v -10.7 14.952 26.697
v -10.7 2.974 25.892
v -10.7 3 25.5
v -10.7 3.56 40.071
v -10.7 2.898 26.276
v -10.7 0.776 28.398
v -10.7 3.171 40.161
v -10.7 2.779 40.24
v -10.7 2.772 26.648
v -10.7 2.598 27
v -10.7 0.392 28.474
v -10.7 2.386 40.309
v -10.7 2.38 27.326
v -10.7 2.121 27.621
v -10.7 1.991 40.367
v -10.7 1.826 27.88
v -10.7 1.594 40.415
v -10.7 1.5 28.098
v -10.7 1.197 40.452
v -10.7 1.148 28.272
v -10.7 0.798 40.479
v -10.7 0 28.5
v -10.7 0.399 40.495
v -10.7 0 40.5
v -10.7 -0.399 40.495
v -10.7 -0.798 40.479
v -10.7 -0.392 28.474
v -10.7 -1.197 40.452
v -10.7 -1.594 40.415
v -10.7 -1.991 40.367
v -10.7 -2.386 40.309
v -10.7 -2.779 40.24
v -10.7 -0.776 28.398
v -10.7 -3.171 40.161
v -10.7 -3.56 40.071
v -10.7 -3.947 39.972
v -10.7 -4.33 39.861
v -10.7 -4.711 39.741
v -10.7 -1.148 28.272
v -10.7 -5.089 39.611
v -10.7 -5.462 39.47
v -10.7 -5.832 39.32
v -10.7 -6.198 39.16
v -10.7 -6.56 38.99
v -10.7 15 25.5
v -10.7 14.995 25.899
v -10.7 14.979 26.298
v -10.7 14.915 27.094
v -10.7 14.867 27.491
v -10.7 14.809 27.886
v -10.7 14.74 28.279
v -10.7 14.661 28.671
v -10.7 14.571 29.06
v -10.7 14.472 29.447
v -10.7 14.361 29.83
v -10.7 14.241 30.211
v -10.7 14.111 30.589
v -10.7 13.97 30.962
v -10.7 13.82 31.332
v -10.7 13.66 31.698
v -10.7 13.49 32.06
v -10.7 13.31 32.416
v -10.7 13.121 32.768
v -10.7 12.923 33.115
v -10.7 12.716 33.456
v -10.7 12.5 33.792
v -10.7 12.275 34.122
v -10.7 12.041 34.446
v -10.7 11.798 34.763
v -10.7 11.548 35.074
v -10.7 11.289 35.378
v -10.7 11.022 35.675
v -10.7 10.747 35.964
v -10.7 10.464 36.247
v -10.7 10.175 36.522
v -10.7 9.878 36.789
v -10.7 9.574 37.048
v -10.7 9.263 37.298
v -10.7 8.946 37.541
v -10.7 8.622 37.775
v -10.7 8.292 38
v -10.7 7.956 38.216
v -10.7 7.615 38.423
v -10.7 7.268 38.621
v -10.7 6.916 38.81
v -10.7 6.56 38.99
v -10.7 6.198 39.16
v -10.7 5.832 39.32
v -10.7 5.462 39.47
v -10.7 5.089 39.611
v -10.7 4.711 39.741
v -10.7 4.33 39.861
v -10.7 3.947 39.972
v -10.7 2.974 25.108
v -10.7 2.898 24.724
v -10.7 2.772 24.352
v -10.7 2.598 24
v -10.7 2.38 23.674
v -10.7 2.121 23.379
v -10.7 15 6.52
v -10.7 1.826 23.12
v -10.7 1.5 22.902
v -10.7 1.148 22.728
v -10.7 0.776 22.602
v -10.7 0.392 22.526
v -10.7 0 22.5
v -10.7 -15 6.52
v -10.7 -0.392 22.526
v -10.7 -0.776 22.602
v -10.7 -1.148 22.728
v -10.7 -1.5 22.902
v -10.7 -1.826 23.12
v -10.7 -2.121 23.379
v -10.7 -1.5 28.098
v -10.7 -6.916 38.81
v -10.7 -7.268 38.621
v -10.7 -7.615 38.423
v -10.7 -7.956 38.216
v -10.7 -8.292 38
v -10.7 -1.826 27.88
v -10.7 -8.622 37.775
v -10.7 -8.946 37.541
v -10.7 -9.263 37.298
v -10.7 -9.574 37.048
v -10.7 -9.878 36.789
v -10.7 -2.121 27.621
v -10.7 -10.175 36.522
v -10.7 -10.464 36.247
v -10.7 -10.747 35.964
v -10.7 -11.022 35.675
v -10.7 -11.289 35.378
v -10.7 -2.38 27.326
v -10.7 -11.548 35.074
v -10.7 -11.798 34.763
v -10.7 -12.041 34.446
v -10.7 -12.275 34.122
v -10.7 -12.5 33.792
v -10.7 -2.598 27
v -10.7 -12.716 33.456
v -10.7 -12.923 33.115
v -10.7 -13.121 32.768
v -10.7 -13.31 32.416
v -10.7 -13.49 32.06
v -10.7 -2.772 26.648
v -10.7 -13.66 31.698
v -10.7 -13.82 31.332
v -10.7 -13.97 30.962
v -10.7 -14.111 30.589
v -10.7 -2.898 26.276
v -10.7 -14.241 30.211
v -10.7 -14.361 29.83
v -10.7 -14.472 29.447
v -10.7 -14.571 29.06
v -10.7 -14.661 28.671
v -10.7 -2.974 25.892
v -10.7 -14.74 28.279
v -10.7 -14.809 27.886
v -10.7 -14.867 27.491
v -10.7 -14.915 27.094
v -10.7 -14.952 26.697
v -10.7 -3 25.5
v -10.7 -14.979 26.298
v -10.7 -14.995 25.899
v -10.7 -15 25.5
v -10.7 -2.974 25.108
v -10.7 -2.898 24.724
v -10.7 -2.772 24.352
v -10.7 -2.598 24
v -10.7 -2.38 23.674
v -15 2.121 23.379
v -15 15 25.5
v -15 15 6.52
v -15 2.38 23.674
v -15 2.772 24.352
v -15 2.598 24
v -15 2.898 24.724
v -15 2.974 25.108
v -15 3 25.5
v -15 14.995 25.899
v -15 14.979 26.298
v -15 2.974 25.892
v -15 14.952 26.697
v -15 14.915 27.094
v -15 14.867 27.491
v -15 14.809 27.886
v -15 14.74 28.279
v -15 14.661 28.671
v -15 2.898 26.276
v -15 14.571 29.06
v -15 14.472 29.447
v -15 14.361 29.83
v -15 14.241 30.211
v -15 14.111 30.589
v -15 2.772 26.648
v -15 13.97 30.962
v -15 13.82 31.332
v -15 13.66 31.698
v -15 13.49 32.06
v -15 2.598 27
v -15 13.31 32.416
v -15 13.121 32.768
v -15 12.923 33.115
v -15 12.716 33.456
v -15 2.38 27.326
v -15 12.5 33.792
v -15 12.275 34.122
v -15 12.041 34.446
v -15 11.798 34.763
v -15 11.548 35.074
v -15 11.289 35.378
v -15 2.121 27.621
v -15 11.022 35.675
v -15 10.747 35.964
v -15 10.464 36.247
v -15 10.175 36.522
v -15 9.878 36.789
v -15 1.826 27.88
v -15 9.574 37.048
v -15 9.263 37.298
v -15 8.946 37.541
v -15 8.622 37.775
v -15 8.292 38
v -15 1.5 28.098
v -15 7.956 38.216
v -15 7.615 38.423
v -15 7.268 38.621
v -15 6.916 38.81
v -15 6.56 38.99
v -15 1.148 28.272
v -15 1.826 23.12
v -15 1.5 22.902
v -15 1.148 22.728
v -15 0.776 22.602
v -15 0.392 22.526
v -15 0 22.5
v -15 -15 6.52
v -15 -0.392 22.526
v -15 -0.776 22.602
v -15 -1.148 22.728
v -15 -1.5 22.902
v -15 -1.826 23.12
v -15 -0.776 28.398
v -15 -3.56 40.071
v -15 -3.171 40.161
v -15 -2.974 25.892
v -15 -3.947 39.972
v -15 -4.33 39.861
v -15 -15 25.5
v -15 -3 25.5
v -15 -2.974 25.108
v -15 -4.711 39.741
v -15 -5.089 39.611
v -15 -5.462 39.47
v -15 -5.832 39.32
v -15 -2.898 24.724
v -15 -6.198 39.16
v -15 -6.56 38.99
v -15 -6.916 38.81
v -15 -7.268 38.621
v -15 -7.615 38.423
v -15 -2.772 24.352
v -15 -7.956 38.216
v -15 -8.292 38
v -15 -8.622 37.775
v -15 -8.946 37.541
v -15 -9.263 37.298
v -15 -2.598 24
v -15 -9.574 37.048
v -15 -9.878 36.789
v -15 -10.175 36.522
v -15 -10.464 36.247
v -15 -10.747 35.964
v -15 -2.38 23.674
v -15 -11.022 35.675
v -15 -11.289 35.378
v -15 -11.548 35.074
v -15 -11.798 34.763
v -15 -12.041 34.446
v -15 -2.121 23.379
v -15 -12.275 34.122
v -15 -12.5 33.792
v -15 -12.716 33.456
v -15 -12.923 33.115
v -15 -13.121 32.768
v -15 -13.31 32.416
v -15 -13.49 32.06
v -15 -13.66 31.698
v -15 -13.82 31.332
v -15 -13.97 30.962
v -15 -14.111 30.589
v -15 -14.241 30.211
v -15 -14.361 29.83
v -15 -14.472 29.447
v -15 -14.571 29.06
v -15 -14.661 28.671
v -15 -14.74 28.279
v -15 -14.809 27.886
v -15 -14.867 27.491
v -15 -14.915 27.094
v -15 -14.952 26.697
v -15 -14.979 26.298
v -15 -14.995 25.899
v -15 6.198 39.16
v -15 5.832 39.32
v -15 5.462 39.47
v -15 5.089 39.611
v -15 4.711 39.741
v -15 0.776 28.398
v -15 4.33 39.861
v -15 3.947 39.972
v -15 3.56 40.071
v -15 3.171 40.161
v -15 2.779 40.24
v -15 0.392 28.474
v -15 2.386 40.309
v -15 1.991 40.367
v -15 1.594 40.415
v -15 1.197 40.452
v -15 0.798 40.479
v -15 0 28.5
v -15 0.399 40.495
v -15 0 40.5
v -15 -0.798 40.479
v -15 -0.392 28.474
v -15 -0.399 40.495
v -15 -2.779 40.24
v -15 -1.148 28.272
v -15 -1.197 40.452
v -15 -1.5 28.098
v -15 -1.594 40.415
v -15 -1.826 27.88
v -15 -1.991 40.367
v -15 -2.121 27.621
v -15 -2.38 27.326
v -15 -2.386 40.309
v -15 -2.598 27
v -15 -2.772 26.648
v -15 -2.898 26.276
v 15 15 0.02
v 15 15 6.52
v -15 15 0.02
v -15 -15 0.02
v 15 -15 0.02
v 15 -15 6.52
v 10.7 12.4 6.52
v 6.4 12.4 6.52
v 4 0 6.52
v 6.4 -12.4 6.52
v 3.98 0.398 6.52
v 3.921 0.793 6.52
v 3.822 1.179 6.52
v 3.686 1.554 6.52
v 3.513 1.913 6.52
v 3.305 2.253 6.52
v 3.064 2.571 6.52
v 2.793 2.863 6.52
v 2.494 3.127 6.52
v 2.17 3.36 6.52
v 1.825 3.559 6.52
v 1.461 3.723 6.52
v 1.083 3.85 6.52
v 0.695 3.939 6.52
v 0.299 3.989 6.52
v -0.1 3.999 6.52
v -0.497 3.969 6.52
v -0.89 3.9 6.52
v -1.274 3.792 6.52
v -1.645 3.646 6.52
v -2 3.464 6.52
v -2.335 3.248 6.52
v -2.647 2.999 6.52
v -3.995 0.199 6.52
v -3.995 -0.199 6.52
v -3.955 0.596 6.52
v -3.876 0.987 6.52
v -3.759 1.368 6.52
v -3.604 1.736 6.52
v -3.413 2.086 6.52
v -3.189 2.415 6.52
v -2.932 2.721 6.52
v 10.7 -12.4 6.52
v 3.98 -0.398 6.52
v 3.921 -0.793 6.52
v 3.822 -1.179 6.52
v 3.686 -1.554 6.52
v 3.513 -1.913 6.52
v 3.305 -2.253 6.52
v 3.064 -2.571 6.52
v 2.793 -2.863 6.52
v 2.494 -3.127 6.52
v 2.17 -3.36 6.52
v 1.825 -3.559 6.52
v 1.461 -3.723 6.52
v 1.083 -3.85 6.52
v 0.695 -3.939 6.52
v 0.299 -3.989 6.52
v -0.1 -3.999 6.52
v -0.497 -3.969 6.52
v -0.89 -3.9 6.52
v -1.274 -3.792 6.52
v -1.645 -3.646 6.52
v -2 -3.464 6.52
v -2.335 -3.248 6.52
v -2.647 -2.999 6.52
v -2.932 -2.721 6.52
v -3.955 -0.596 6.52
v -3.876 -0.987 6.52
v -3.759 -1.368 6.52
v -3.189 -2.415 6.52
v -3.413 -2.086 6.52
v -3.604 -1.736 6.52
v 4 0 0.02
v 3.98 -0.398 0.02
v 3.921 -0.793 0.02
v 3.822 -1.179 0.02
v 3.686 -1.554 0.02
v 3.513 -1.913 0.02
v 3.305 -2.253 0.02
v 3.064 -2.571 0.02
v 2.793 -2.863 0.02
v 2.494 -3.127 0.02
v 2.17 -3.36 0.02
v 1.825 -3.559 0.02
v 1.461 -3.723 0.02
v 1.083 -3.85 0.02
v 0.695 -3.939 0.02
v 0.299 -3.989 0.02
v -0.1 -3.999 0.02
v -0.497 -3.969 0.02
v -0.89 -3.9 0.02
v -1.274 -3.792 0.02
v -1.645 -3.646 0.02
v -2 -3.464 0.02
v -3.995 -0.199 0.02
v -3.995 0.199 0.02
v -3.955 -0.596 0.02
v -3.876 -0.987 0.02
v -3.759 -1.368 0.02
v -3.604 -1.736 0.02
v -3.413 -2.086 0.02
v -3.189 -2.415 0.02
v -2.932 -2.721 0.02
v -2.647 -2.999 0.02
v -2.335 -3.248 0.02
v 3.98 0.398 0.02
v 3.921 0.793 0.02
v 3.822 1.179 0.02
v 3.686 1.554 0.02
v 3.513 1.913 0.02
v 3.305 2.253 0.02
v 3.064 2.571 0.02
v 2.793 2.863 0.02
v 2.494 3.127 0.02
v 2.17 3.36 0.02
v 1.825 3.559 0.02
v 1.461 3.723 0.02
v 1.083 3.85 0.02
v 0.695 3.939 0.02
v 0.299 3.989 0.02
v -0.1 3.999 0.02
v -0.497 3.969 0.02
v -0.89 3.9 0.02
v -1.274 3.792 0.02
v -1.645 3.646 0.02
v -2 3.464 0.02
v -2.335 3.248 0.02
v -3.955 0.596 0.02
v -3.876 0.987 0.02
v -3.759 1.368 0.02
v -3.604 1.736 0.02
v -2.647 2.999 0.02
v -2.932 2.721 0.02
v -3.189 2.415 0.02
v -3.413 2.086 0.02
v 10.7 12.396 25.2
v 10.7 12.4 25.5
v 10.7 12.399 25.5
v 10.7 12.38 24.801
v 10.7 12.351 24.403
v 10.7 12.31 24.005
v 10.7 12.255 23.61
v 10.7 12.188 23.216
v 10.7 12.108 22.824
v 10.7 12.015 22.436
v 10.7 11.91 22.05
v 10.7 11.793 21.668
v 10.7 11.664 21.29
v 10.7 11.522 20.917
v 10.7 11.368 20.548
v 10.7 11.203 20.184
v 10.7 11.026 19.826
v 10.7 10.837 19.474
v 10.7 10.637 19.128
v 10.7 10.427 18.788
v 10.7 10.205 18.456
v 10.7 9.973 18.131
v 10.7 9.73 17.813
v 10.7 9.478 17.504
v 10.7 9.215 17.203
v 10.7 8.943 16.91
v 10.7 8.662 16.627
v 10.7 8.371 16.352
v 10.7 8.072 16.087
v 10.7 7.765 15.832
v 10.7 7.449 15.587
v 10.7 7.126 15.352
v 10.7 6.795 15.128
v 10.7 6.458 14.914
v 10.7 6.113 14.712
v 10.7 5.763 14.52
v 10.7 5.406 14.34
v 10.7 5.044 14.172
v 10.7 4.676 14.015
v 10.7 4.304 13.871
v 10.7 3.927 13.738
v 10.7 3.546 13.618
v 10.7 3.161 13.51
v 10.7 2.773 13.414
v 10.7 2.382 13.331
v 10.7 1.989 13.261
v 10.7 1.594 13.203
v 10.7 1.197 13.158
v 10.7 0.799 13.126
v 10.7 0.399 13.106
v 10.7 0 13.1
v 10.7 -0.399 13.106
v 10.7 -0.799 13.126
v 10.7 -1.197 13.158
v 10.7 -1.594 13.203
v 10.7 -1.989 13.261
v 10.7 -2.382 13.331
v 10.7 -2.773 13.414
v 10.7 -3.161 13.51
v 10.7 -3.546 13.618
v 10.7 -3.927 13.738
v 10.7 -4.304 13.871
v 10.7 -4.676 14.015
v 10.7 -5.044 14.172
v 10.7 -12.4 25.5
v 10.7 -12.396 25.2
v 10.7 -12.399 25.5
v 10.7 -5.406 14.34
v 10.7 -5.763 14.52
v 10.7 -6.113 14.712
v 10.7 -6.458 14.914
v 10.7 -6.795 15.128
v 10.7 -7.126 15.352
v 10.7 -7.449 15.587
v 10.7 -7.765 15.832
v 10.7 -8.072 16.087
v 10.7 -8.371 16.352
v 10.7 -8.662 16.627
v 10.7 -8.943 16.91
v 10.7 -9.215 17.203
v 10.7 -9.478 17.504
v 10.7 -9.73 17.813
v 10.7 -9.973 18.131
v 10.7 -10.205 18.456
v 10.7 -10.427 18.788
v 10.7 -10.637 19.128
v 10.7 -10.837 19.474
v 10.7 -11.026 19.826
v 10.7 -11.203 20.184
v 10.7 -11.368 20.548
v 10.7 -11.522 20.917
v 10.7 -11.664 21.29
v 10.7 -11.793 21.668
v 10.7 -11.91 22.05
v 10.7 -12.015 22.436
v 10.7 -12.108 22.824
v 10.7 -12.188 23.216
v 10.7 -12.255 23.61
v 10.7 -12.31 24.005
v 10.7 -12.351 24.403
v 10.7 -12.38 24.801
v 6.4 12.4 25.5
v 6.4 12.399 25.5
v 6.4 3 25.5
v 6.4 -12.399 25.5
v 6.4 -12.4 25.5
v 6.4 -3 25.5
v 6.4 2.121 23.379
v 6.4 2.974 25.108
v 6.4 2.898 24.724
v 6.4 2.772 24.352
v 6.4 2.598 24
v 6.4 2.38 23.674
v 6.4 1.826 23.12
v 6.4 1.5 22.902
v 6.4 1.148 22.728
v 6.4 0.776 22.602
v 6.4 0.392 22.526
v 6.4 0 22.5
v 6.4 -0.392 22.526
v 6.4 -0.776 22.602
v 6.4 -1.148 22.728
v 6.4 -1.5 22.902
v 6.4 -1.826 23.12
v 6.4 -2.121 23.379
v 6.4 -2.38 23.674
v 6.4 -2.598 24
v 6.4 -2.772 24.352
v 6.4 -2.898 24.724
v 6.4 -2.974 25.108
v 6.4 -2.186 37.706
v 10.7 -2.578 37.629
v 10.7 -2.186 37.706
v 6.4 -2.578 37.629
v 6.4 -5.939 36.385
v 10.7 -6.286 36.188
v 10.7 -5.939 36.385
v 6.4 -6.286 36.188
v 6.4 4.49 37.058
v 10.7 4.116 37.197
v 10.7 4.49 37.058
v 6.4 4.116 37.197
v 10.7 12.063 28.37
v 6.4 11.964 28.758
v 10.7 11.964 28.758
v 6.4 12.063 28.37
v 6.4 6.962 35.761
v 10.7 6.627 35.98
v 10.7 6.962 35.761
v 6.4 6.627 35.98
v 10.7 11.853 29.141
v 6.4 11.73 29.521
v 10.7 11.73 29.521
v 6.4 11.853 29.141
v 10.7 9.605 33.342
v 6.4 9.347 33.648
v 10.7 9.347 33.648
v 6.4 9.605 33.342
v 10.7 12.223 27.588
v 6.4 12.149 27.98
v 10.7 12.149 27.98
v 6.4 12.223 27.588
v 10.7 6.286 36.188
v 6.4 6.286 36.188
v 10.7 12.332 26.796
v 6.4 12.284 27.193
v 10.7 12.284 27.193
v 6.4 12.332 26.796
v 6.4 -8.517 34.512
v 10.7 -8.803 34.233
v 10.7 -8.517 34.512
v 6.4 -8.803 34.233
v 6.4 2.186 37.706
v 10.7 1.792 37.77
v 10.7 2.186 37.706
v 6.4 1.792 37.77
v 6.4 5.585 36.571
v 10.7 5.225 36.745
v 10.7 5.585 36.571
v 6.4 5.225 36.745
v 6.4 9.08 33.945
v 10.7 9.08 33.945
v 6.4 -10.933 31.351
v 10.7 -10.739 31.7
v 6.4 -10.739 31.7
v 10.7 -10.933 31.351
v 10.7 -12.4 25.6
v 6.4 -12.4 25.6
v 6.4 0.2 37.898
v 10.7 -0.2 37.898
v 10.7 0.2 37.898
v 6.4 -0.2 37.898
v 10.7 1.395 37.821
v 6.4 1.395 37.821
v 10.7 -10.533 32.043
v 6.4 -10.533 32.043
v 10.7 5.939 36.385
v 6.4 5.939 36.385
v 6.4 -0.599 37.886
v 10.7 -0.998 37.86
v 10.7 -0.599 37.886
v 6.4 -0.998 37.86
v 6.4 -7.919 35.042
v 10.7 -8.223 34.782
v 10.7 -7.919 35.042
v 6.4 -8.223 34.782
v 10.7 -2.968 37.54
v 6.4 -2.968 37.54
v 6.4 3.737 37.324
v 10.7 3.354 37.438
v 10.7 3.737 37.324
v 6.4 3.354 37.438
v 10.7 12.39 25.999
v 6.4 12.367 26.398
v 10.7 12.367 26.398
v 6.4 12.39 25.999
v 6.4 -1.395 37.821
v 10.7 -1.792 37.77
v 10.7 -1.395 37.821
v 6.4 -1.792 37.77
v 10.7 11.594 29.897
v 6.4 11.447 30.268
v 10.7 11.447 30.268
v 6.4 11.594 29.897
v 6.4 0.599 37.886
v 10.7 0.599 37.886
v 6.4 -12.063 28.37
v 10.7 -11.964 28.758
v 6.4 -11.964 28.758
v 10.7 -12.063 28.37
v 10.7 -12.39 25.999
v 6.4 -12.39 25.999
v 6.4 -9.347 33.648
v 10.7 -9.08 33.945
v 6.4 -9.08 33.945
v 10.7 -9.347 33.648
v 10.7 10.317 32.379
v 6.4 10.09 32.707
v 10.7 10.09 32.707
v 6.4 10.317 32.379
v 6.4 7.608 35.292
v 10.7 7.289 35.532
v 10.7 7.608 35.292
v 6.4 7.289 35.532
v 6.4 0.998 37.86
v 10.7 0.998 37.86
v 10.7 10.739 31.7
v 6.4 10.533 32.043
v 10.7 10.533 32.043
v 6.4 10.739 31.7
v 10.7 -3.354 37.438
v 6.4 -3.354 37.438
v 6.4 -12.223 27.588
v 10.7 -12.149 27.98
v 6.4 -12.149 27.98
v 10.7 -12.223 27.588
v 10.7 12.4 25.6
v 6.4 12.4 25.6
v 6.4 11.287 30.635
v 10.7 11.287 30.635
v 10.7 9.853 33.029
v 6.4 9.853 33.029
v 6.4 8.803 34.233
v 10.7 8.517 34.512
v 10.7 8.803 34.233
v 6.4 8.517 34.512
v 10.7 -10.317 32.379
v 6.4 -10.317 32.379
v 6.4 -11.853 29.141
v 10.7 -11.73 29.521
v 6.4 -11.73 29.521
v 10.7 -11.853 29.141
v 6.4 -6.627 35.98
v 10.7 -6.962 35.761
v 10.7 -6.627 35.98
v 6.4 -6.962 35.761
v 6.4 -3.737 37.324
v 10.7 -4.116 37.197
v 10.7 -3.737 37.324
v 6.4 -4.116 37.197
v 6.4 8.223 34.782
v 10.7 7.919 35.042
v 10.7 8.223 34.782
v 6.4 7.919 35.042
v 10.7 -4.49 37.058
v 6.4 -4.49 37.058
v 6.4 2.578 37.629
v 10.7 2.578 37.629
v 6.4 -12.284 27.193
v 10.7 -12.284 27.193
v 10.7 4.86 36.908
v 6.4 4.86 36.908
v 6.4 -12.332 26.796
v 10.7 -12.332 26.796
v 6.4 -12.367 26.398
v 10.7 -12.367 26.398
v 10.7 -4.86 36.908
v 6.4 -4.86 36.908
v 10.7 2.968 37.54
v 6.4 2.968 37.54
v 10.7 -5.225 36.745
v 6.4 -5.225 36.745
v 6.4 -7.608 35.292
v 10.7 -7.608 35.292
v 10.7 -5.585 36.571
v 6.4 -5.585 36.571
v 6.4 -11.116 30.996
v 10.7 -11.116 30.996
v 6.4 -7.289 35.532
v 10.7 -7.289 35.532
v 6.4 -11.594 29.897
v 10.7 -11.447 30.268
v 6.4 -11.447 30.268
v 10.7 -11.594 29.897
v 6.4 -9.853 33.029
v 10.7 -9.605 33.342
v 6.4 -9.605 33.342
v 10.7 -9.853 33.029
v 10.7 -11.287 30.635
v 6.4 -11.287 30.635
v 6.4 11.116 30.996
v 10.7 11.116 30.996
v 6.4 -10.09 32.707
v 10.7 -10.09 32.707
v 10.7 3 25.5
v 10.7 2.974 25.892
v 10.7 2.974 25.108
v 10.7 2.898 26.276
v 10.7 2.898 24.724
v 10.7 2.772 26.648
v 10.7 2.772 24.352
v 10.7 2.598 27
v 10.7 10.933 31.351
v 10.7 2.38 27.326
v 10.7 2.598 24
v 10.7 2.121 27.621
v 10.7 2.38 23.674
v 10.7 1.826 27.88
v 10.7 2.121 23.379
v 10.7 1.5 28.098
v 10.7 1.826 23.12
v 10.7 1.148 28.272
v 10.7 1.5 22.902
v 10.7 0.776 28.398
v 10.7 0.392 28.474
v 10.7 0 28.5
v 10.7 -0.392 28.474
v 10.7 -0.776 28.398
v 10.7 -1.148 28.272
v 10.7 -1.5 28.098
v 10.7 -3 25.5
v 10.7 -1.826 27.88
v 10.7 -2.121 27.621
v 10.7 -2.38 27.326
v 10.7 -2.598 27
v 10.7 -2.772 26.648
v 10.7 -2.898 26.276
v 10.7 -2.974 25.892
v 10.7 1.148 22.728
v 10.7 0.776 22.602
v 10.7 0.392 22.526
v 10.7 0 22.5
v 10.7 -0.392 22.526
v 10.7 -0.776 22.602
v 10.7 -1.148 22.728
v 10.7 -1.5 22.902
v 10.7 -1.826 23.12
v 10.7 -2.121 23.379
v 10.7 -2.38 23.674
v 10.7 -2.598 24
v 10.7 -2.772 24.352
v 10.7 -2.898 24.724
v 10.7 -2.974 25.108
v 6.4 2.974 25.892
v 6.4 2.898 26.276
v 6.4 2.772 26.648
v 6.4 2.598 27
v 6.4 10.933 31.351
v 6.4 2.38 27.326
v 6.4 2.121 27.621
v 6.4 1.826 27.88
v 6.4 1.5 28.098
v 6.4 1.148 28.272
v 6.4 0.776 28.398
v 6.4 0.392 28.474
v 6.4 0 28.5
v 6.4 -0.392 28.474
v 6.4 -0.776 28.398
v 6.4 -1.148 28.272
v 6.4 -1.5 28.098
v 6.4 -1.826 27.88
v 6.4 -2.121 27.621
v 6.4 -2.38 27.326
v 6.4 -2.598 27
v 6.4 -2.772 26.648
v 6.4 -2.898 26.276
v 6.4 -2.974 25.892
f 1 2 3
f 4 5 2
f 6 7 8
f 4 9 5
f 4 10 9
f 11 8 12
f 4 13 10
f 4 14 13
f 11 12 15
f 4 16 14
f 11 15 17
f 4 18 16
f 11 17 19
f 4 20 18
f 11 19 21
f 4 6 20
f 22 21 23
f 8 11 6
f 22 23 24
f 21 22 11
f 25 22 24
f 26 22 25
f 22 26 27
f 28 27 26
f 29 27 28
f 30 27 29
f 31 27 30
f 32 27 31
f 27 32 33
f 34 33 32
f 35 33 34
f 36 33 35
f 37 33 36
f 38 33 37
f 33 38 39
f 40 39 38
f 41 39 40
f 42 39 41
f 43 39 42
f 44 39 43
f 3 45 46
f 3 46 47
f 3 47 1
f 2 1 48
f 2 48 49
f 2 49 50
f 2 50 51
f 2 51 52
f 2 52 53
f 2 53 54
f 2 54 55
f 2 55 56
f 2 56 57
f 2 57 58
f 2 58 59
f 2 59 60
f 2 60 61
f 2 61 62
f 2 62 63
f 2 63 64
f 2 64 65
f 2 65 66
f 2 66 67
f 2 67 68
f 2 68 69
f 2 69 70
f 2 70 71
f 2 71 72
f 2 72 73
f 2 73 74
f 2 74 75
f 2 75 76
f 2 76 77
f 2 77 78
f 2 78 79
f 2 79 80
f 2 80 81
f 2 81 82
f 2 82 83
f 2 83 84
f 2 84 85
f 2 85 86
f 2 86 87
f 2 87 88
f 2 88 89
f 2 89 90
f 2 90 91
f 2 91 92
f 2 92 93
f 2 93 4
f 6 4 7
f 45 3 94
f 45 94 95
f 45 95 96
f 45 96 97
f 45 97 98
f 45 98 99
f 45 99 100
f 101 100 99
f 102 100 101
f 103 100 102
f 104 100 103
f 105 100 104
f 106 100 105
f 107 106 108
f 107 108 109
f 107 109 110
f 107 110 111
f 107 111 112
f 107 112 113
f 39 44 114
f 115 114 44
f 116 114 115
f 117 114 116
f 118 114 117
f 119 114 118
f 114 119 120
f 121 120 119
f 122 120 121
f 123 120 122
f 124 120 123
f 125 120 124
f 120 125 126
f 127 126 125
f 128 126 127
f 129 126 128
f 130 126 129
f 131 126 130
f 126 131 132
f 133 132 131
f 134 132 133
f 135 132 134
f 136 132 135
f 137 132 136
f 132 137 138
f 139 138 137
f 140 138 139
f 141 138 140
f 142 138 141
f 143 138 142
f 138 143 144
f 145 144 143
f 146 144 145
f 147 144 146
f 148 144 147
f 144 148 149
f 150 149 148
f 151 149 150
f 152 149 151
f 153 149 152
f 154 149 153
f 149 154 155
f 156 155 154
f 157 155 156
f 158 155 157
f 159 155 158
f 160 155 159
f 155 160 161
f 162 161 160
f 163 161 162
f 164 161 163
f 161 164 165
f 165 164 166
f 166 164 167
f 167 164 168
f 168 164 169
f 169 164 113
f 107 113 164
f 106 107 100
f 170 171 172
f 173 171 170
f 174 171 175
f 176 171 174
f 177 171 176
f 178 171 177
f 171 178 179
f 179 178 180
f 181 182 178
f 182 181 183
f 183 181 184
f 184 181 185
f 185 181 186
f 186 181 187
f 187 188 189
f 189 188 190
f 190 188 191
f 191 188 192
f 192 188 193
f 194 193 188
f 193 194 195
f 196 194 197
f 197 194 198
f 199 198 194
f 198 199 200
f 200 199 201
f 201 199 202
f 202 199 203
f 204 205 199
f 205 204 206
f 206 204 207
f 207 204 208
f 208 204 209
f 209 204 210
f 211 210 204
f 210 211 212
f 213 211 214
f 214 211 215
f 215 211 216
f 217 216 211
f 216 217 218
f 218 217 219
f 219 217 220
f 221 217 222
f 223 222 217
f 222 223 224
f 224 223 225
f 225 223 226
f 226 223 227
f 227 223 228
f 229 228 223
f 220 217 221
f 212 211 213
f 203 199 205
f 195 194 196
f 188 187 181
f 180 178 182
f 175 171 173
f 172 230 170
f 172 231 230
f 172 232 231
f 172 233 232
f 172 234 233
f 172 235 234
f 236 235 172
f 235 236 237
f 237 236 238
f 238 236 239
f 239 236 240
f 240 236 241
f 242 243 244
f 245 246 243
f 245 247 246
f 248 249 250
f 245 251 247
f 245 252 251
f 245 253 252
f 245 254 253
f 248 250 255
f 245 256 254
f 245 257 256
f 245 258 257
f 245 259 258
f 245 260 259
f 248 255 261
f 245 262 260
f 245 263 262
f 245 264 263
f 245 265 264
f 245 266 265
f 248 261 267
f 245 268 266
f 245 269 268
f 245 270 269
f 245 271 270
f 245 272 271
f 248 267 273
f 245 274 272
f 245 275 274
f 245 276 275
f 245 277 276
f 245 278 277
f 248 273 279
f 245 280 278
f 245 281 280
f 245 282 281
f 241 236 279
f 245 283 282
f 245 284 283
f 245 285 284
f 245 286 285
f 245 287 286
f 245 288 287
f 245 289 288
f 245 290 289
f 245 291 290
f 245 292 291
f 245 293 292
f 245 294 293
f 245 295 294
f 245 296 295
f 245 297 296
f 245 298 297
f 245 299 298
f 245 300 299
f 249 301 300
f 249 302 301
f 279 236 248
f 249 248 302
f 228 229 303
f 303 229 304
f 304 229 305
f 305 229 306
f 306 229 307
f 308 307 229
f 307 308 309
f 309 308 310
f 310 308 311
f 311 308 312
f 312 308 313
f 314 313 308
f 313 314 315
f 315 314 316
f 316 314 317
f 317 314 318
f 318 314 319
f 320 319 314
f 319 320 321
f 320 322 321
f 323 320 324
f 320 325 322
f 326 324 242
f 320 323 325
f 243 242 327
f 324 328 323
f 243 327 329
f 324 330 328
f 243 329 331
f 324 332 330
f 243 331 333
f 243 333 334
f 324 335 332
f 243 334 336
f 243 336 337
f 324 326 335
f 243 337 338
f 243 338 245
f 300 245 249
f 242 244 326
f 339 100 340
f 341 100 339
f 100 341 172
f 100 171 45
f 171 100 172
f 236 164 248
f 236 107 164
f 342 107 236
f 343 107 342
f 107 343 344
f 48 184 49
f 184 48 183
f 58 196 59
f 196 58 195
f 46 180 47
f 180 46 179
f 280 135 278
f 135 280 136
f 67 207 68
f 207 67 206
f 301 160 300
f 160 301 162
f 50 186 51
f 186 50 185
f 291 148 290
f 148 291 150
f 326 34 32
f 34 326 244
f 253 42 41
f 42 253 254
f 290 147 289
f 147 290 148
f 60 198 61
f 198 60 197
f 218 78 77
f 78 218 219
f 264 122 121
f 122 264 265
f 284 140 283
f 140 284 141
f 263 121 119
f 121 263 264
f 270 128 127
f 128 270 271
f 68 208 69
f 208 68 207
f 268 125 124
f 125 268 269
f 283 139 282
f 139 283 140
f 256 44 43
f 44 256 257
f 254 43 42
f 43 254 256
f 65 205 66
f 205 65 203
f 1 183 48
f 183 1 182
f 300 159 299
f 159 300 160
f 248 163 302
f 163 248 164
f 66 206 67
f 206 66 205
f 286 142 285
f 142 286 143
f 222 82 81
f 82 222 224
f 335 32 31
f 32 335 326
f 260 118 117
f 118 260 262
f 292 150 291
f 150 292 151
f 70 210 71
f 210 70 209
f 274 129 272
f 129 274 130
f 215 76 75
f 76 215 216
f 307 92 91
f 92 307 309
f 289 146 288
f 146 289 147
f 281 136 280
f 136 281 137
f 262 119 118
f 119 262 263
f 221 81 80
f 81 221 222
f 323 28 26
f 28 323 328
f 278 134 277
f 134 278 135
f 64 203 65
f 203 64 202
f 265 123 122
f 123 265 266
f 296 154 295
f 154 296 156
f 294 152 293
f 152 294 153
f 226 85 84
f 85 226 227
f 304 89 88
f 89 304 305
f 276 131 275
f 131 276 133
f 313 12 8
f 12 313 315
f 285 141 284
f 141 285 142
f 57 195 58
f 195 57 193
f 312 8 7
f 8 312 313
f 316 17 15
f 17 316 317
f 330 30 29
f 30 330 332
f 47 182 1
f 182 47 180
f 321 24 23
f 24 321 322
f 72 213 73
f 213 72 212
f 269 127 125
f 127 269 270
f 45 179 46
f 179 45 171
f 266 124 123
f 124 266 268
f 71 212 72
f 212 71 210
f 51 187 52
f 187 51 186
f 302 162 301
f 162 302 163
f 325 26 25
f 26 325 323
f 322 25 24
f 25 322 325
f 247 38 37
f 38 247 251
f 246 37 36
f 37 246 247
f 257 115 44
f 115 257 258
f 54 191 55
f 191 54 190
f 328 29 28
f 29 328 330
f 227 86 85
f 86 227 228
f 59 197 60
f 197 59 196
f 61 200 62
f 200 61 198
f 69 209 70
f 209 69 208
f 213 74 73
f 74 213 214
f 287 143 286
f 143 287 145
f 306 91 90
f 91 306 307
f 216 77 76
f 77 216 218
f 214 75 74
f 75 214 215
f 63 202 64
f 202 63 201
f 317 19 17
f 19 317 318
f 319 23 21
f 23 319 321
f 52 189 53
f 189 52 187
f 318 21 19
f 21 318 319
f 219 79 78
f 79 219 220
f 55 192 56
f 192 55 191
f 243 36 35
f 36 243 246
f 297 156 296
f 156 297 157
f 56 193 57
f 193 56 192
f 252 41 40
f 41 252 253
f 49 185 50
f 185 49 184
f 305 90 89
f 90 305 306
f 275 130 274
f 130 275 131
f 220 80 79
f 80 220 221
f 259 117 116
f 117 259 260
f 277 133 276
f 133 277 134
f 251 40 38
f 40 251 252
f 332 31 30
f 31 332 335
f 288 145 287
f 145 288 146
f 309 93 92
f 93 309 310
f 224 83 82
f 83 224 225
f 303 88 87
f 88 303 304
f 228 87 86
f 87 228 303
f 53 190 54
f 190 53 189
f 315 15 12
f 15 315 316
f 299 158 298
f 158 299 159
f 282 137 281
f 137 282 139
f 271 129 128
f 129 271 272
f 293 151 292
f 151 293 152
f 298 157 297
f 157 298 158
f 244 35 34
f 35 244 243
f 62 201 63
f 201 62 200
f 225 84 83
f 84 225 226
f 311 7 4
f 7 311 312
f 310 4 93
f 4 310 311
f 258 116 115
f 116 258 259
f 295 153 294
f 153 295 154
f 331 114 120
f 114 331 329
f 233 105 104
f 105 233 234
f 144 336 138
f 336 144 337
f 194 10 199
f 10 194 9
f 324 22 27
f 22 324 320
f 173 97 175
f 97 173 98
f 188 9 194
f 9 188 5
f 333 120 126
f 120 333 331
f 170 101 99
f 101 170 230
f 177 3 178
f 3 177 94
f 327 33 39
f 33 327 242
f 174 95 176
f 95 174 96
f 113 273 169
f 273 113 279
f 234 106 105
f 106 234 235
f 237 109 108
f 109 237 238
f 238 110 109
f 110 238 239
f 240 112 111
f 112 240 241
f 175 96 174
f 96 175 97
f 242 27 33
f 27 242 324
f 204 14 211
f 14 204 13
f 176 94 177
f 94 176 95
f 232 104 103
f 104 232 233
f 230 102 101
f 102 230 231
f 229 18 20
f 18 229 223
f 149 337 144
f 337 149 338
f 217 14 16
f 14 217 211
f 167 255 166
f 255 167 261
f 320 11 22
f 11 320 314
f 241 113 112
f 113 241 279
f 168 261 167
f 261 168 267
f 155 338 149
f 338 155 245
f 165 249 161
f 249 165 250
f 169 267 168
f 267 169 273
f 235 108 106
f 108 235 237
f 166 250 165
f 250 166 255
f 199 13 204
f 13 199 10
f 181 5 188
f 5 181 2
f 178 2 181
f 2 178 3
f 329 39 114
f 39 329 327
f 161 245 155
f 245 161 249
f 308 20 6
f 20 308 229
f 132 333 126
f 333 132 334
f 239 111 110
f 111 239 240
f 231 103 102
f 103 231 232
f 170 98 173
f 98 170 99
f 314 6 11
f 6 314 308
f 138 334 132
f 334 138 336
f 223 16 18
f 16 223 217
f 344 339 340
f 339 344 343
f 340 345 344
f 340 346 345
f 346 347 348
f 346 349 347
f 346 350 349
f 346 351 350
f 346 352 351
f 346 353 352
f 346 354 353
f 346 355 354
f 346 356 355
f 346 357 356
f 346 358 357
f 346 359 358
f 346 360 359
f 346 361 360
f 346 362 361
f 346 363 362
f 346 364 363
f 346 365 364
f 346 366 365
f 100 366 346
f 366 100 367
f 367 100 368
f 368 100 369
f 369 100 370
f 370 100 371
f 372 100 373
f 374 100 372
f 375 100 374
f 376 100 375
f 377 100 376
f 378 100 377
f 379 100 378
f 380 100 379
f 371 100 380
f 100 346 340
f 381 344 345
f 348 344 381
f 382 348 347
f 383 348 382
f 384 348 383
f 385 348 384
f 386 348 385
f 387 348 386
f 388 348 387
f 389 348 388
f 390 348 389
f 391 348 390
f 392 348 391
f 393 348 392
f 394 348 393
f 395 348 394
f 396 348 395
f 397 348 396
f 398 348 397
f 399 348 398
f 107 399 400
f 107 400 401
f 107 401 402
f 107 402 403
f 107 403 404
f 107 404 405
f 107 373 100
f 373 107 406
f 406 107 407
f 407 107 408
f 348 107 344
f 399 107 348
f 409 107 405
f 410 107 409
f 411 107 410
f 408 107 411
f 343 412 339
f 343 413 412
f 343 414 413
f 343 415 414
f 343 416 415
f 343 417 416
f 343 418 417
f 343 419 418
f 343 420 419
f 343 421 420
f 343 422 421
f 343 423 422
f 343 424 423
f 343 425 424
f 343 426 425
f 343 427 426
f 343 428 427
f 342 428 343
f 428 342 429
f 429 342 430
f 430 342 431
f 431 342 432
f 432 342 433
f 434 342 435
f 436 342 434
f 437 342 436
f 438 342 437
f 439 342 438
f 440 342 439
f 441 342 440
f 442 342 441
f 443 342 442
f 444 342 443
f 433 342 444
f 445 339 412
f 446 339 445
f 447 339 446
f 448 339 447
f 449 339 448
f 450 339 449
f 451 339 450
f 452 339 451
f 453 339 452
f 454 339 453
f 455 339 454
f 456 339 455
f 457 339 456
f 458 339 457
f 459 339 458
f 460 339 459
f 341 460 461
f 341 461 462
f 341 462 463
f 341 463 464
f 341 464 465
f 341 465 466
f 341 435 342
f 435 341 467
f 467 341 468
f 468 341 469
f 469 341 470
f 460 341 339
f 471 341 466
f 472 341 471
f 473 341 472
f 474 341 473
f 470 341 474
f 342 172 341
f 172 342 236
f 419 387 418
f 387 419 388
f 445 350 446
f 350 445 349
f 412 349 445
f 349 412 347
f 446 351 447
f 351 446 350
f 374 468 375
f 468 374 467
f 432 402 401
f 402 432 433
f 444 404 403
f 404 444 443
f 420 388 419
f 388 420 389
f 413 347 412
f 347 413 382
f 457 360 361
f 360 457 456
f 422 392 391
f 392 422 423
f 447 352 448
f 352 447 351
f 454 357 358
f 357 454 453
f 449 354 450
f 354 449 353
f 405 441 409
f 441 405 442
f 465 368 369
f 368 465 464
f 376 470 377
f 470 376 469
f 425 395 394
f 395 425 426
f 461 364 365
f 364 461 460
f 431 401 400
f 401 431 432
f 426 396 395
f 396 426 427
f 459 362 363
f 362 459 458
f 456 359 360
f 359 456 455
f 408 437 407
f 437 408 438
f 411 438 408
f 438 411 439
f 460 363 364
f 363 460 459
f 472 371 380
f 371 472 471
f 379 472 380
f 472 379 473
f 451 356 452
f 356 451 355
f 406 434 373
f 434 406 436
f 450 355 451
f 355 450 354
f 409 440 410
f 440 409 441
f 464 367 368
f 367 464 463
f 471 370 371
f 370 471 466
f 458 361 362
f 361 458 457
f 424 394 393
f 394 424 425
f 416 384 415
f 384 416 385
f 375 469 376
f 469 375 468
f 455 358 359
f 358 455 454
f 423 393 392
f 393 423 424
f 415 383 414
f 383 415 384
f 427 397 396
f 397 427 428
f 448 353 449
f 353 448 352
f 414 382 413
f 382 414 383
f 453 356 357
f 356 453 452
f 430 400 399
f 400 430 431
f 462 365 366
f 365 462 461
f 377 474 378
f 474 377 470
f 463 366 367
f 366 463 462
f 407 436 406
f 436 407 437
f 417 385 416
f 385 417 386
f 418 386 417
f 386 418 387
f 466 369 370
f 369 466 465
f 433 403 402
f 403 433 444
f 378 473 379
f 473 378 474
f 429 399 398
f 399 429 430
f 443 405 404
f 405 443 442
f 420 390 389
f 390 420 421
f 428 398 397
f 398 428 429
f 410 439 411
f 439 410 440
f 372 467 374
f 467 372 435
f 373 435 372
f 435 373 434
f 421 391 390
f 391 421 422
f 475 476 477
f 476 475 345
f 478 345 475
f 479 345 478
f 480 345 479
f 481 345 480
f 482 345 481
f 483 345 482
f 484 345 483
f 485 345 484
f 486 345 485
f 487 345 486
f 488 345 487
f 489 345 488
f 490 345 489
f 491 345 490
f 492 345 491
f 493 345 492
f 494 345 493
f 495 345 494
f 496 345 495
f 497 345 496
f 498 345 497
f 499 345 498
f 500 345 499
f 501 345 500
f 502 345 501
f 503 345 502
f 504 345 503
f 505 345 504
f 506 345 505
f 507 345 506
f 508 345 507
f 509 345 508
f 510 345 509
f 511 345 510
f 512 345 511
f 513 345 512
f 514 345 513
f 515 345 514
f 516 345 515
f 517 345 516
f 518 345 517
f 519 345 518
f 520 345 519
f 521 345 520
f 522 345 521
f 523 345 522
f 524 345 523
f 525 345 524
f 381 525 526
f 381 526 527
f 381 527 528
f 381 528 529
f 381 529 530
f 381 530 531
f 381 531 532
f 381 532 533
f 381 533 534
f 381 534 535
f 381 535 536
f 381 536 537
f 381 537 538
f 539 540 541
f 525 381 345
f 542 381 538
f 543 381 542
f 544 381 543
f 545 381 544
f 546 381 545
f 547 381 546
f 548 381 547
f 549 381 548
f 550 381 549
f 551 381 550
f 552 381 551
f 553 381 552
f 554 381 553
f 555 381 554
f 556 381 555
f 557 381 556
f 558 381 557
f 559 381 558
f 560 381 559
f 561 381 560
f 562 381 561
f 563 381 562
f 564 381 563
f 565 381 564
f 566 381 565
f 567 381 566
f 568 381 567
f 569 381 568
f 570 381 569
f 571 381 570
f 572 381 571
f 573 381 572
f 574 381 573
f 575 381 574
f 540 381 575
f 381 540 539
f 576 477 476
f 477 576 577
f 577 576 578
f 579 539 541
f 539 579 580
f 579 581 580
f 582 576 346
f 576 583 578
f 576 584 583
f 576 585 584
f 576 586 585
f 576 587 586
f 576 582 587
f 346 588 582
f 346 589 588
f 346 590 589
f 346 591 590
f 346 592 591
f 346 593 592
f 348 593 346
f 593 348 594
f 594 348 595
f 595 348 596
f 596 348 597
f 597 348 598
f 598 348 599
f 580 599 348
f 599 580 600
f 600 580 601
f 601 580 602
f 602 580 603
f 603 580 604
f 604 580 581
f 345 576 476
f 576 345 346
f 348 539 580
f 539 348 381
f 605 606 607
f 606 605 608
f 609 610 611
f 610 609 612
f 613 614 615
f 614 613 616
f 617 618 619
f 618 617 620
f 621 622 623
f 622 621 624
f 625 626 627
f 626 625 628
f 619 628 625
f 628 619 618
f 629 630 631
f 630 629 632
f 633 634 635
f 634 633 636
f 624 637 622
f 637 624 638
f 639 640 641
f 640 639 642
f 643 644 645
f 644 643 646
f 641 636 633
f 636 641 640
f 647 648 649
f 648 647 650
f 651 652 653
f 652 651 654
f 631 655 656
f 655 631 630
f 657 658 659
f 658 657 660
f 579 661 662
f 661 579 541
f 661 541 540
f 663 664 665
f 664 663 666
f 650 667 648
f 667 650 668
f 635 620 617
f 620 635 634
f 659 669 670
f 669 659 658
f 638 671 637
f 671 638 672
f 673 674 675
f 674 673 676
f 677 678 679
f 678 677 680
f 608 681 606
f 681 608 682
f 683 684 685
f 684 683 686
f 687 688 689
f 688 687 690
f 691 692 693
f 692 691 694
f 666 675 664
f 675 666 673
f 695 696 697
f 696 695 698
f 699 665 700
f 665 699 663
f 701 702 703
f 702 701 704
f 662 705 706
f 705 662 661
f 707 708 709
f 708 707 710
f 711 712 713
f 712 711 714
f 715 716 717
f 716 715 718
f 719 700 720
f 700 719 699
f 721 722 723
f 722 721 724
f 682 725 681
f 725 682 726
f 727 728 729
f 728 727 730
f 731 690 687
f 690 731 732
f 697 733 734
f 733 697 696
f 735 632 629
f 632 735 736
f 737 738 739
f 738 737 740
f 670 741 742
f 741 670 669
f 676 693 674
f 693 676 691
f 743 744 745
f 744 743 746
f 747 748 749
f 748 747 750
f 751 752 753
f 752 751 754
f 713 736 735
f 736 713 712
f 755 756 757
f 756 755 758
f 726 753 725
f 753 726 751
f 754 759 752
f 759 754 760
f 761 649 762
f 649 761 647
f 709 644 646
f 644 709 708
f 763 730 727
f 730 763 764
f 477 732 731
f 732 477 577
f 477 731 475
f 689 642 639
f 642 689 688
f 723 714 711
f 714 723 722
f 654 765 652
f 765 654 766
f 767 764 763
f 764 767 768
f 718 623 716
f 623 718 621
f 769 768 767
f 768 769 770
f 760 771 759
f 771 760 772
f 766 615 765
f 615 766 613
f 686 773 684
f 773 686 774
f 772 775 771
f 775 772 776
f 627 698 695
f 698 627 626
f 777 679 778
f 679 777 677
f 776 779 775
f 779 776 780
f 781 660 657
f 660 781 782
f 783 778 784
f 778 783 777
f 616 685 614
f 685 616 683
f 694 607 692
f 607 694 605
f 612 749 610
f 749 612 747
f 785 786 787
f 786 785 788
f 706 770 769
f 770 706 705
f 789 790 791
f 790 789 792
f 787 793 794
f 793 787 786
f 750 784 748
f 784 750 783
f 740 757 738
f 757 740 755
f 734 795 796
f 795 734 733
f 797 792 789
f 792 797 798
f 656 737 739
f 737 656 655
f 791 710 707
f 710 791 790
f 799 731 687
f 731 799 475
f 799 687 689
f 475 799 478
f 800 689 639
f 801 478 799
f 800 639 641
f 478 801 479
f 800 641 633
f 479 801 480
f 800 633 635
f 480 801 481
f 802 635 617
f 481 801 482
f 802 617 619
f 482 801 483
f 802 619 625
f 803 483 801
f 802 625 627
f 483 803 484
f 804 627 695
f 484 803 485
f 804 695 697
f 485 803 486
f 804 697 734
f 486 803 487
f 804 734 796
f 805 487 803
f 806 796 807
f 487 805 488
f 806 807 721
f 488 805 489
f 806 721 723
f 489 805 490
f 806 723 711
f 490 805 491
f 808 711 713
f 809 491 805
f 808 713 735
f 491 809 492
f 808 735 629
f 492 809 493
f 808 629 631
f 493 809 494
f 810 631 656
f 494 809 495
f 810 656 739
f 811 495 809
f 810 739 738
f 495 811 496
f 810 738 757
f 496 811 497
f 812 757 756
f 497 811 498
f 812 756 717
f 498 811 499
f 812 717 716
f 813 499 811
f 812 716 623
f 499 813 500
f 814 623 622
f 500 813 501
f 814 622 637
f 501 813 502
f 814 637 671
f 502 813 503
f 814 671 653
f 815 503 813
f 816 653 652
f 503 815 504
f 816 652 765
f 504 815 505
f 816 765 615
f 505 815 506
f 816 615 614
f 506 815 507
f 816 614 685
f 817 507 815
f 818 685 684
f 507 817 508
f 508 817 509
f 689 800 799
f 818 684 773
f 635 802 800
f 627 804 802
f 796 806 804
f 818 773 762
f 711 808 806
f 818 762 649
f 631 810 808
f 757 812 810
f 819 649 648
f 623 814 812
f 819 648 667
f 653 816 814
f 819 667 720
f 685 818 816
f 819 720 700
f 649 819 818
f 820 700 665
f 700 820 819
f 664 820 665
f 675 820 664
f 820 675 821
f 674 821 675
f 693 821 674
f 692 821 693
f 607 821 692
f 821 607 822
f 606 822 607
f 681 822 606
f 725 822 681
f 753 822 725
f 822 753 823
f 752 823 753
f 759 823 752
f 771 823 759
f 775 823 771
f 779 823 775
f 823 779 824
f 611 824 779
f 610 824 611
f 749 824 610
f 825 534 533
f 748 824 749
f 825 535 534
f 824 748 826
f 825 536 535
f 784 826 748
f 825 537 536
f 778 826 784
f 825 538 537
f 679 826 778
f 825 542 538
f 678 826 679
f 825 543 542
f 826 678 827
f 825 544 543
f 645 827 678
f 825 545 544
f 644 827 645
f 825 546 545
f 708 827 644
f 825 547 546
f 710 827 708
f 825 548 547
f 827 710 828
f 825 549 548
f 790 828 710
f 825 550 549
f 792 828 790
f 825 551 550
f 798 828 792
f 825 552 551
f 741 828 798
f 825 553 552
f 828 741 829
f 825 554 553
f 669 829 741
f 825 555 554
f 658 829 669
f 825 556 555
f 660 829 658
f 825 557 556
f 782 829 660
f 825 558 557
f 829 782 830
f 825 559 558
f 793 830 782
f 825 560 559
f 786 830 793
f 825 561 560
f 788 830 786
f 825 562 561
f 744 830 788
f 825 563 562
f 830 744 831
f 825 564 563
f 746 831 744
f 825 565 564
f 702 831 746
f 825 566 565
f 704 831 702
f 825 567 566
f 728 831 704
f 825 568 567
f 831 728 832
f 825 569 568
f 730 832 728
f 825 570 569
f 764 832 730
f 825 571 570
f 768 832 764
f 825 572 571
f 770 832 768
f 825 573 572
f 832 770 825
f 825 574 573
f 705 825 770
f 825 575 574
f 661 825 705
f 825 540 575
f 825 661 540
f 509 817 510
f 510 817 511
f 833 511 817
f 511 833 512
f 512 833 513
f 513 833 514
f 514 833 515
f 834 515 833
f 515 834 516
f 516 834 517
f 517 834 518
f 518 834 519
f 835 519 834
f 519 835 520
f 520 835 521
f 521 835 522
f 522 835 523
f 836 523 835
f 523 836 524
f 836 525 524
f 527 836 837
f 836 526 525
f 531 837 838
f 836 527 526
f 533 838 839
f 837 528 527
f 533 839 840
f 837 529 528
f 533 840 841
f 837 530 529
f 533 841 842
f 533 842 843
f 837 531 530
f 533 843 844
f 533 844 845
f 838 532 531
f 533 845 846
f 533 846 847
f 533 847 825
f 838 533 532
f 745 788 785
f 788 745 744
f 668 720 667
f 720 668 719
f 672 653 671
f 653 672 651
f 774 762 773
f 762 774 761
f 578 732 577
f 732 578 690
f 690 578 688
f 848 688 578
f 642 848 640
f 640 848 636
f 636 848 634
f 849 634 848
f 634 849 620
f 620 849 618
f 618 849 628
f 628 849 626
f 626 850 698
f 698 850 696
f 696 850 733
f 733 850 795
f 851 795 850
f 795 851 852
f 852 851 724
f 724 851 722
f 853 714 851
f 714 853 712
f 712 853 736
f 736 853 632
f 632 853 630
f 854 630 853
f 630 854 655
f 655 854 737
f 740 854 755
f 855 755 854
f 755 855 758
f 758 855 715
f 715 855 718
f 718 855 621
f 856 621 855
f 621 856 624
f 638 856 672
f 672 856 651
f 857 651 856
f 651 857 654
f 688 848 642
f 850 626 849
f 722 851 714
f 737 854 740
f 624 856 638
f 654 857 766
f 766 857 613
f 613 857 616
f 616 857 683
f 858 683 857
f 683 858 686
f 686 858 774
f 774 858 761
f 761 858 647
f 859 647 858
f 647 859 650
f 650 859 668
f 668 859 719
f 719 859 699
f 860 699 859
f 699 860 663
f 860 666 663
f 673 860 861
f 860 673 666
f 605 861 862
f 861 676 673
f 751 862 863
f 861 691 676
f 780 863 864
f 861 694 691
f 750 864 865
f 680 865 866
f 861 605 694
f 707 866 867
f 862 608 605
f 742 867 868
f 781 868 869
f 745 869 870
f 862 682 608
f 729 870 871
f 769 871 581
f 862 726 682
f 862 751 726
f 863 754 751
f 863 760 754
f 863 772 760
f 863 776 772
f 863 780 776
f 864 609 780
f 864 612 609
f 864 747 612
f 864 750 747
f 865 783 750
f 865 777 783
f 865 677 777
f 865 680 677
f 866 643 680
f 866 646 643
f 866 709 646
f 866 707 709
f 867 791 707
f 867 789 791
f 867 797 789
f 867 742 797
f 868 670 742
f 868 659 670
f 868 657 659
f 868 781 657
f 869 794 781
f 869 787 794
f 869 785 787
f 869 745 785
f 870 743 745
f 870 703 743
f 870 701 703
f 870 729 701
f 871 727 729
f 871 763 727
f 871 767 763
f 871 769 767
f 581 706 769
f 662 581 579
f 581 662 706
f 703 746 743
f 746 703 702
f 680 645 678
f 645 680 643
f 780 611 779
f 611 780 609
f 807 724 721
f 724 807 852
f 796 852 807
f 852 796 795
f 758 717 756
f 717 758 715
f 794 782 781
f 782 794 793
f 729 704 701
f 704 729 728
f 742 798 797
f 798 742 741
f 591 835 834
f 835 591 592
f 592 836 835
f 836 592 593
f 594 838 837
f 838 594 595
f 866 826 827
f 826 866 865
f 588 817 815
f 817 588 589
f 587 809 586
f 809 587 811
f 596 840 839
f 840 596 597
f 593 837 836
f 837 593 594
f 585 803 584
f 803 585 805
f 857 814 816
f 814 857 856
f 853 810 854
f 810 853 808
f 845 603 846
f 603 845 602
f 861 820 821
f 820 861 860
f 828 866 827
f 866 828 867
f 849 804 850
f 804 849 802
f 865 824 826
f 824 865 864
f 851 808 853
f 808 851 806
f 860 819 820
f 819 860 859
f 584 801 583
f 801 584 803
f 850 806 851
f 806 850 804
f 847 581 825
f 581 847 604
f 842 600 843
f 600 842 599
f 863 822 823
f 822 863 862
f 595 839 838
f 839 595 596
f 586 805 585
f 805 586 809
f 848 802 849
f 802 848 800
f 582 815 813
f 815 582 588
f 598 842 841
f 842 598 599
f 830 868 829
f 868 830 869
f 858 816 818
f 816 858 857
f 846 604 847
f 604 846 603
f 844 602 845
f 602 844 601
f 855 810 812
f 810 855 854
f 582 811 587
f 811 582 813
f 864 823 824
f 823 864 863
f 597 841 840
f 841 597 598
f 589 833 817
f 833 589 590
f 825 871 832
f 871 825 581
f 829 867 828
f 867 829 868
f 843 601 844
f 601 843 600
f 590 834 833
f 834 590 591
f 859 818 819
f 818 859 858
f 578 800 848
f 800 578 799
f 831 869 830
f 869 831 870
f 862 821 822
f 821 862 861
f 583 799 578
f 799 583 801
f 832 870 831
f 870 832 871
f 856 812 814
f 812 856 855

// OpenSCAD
$fa = 1;
$fs = 0.4;

translate([-(15-4.3/2),0,19/2+6.5])

difference(){
cube([4.3,30,19],center=true);

translate([0,0,19/2])
rotate([0,90,0])
cylinder(h=4.3+0.001,r=3,center=true);

}



translate([-(15-4.3/2),0,19+6.5])
rotate([0,90,0])
difference(){
cylinder(h=4.3,r=15,center=true);
cylinder(h=4.3+0.001,r=3,center=true);
}

translate([0,0,6.5/2+0.02])
difference(){
color([1,0,0])cube([30,30,6.5],center=true);
cylinder(h=6.6,r=4,center=true);
}

translate([15-4.3-4.3/2,0,19/2+6.5])
difference(){
cube([4.3,24.8,19],center=true);

translate([0,0,19/2])
rotate([0,90,0])
    cylinder(h=4.3+0.001,r=3,center=true);
}



translate([(15-4.3/2-4.3),0,19+6.5])
rotate([0,90,0])

difference(){
cylinder(h=4.3,r=12.4,center=true);
cylinder(h=4.3+0.001,r=3,center=true);
}
